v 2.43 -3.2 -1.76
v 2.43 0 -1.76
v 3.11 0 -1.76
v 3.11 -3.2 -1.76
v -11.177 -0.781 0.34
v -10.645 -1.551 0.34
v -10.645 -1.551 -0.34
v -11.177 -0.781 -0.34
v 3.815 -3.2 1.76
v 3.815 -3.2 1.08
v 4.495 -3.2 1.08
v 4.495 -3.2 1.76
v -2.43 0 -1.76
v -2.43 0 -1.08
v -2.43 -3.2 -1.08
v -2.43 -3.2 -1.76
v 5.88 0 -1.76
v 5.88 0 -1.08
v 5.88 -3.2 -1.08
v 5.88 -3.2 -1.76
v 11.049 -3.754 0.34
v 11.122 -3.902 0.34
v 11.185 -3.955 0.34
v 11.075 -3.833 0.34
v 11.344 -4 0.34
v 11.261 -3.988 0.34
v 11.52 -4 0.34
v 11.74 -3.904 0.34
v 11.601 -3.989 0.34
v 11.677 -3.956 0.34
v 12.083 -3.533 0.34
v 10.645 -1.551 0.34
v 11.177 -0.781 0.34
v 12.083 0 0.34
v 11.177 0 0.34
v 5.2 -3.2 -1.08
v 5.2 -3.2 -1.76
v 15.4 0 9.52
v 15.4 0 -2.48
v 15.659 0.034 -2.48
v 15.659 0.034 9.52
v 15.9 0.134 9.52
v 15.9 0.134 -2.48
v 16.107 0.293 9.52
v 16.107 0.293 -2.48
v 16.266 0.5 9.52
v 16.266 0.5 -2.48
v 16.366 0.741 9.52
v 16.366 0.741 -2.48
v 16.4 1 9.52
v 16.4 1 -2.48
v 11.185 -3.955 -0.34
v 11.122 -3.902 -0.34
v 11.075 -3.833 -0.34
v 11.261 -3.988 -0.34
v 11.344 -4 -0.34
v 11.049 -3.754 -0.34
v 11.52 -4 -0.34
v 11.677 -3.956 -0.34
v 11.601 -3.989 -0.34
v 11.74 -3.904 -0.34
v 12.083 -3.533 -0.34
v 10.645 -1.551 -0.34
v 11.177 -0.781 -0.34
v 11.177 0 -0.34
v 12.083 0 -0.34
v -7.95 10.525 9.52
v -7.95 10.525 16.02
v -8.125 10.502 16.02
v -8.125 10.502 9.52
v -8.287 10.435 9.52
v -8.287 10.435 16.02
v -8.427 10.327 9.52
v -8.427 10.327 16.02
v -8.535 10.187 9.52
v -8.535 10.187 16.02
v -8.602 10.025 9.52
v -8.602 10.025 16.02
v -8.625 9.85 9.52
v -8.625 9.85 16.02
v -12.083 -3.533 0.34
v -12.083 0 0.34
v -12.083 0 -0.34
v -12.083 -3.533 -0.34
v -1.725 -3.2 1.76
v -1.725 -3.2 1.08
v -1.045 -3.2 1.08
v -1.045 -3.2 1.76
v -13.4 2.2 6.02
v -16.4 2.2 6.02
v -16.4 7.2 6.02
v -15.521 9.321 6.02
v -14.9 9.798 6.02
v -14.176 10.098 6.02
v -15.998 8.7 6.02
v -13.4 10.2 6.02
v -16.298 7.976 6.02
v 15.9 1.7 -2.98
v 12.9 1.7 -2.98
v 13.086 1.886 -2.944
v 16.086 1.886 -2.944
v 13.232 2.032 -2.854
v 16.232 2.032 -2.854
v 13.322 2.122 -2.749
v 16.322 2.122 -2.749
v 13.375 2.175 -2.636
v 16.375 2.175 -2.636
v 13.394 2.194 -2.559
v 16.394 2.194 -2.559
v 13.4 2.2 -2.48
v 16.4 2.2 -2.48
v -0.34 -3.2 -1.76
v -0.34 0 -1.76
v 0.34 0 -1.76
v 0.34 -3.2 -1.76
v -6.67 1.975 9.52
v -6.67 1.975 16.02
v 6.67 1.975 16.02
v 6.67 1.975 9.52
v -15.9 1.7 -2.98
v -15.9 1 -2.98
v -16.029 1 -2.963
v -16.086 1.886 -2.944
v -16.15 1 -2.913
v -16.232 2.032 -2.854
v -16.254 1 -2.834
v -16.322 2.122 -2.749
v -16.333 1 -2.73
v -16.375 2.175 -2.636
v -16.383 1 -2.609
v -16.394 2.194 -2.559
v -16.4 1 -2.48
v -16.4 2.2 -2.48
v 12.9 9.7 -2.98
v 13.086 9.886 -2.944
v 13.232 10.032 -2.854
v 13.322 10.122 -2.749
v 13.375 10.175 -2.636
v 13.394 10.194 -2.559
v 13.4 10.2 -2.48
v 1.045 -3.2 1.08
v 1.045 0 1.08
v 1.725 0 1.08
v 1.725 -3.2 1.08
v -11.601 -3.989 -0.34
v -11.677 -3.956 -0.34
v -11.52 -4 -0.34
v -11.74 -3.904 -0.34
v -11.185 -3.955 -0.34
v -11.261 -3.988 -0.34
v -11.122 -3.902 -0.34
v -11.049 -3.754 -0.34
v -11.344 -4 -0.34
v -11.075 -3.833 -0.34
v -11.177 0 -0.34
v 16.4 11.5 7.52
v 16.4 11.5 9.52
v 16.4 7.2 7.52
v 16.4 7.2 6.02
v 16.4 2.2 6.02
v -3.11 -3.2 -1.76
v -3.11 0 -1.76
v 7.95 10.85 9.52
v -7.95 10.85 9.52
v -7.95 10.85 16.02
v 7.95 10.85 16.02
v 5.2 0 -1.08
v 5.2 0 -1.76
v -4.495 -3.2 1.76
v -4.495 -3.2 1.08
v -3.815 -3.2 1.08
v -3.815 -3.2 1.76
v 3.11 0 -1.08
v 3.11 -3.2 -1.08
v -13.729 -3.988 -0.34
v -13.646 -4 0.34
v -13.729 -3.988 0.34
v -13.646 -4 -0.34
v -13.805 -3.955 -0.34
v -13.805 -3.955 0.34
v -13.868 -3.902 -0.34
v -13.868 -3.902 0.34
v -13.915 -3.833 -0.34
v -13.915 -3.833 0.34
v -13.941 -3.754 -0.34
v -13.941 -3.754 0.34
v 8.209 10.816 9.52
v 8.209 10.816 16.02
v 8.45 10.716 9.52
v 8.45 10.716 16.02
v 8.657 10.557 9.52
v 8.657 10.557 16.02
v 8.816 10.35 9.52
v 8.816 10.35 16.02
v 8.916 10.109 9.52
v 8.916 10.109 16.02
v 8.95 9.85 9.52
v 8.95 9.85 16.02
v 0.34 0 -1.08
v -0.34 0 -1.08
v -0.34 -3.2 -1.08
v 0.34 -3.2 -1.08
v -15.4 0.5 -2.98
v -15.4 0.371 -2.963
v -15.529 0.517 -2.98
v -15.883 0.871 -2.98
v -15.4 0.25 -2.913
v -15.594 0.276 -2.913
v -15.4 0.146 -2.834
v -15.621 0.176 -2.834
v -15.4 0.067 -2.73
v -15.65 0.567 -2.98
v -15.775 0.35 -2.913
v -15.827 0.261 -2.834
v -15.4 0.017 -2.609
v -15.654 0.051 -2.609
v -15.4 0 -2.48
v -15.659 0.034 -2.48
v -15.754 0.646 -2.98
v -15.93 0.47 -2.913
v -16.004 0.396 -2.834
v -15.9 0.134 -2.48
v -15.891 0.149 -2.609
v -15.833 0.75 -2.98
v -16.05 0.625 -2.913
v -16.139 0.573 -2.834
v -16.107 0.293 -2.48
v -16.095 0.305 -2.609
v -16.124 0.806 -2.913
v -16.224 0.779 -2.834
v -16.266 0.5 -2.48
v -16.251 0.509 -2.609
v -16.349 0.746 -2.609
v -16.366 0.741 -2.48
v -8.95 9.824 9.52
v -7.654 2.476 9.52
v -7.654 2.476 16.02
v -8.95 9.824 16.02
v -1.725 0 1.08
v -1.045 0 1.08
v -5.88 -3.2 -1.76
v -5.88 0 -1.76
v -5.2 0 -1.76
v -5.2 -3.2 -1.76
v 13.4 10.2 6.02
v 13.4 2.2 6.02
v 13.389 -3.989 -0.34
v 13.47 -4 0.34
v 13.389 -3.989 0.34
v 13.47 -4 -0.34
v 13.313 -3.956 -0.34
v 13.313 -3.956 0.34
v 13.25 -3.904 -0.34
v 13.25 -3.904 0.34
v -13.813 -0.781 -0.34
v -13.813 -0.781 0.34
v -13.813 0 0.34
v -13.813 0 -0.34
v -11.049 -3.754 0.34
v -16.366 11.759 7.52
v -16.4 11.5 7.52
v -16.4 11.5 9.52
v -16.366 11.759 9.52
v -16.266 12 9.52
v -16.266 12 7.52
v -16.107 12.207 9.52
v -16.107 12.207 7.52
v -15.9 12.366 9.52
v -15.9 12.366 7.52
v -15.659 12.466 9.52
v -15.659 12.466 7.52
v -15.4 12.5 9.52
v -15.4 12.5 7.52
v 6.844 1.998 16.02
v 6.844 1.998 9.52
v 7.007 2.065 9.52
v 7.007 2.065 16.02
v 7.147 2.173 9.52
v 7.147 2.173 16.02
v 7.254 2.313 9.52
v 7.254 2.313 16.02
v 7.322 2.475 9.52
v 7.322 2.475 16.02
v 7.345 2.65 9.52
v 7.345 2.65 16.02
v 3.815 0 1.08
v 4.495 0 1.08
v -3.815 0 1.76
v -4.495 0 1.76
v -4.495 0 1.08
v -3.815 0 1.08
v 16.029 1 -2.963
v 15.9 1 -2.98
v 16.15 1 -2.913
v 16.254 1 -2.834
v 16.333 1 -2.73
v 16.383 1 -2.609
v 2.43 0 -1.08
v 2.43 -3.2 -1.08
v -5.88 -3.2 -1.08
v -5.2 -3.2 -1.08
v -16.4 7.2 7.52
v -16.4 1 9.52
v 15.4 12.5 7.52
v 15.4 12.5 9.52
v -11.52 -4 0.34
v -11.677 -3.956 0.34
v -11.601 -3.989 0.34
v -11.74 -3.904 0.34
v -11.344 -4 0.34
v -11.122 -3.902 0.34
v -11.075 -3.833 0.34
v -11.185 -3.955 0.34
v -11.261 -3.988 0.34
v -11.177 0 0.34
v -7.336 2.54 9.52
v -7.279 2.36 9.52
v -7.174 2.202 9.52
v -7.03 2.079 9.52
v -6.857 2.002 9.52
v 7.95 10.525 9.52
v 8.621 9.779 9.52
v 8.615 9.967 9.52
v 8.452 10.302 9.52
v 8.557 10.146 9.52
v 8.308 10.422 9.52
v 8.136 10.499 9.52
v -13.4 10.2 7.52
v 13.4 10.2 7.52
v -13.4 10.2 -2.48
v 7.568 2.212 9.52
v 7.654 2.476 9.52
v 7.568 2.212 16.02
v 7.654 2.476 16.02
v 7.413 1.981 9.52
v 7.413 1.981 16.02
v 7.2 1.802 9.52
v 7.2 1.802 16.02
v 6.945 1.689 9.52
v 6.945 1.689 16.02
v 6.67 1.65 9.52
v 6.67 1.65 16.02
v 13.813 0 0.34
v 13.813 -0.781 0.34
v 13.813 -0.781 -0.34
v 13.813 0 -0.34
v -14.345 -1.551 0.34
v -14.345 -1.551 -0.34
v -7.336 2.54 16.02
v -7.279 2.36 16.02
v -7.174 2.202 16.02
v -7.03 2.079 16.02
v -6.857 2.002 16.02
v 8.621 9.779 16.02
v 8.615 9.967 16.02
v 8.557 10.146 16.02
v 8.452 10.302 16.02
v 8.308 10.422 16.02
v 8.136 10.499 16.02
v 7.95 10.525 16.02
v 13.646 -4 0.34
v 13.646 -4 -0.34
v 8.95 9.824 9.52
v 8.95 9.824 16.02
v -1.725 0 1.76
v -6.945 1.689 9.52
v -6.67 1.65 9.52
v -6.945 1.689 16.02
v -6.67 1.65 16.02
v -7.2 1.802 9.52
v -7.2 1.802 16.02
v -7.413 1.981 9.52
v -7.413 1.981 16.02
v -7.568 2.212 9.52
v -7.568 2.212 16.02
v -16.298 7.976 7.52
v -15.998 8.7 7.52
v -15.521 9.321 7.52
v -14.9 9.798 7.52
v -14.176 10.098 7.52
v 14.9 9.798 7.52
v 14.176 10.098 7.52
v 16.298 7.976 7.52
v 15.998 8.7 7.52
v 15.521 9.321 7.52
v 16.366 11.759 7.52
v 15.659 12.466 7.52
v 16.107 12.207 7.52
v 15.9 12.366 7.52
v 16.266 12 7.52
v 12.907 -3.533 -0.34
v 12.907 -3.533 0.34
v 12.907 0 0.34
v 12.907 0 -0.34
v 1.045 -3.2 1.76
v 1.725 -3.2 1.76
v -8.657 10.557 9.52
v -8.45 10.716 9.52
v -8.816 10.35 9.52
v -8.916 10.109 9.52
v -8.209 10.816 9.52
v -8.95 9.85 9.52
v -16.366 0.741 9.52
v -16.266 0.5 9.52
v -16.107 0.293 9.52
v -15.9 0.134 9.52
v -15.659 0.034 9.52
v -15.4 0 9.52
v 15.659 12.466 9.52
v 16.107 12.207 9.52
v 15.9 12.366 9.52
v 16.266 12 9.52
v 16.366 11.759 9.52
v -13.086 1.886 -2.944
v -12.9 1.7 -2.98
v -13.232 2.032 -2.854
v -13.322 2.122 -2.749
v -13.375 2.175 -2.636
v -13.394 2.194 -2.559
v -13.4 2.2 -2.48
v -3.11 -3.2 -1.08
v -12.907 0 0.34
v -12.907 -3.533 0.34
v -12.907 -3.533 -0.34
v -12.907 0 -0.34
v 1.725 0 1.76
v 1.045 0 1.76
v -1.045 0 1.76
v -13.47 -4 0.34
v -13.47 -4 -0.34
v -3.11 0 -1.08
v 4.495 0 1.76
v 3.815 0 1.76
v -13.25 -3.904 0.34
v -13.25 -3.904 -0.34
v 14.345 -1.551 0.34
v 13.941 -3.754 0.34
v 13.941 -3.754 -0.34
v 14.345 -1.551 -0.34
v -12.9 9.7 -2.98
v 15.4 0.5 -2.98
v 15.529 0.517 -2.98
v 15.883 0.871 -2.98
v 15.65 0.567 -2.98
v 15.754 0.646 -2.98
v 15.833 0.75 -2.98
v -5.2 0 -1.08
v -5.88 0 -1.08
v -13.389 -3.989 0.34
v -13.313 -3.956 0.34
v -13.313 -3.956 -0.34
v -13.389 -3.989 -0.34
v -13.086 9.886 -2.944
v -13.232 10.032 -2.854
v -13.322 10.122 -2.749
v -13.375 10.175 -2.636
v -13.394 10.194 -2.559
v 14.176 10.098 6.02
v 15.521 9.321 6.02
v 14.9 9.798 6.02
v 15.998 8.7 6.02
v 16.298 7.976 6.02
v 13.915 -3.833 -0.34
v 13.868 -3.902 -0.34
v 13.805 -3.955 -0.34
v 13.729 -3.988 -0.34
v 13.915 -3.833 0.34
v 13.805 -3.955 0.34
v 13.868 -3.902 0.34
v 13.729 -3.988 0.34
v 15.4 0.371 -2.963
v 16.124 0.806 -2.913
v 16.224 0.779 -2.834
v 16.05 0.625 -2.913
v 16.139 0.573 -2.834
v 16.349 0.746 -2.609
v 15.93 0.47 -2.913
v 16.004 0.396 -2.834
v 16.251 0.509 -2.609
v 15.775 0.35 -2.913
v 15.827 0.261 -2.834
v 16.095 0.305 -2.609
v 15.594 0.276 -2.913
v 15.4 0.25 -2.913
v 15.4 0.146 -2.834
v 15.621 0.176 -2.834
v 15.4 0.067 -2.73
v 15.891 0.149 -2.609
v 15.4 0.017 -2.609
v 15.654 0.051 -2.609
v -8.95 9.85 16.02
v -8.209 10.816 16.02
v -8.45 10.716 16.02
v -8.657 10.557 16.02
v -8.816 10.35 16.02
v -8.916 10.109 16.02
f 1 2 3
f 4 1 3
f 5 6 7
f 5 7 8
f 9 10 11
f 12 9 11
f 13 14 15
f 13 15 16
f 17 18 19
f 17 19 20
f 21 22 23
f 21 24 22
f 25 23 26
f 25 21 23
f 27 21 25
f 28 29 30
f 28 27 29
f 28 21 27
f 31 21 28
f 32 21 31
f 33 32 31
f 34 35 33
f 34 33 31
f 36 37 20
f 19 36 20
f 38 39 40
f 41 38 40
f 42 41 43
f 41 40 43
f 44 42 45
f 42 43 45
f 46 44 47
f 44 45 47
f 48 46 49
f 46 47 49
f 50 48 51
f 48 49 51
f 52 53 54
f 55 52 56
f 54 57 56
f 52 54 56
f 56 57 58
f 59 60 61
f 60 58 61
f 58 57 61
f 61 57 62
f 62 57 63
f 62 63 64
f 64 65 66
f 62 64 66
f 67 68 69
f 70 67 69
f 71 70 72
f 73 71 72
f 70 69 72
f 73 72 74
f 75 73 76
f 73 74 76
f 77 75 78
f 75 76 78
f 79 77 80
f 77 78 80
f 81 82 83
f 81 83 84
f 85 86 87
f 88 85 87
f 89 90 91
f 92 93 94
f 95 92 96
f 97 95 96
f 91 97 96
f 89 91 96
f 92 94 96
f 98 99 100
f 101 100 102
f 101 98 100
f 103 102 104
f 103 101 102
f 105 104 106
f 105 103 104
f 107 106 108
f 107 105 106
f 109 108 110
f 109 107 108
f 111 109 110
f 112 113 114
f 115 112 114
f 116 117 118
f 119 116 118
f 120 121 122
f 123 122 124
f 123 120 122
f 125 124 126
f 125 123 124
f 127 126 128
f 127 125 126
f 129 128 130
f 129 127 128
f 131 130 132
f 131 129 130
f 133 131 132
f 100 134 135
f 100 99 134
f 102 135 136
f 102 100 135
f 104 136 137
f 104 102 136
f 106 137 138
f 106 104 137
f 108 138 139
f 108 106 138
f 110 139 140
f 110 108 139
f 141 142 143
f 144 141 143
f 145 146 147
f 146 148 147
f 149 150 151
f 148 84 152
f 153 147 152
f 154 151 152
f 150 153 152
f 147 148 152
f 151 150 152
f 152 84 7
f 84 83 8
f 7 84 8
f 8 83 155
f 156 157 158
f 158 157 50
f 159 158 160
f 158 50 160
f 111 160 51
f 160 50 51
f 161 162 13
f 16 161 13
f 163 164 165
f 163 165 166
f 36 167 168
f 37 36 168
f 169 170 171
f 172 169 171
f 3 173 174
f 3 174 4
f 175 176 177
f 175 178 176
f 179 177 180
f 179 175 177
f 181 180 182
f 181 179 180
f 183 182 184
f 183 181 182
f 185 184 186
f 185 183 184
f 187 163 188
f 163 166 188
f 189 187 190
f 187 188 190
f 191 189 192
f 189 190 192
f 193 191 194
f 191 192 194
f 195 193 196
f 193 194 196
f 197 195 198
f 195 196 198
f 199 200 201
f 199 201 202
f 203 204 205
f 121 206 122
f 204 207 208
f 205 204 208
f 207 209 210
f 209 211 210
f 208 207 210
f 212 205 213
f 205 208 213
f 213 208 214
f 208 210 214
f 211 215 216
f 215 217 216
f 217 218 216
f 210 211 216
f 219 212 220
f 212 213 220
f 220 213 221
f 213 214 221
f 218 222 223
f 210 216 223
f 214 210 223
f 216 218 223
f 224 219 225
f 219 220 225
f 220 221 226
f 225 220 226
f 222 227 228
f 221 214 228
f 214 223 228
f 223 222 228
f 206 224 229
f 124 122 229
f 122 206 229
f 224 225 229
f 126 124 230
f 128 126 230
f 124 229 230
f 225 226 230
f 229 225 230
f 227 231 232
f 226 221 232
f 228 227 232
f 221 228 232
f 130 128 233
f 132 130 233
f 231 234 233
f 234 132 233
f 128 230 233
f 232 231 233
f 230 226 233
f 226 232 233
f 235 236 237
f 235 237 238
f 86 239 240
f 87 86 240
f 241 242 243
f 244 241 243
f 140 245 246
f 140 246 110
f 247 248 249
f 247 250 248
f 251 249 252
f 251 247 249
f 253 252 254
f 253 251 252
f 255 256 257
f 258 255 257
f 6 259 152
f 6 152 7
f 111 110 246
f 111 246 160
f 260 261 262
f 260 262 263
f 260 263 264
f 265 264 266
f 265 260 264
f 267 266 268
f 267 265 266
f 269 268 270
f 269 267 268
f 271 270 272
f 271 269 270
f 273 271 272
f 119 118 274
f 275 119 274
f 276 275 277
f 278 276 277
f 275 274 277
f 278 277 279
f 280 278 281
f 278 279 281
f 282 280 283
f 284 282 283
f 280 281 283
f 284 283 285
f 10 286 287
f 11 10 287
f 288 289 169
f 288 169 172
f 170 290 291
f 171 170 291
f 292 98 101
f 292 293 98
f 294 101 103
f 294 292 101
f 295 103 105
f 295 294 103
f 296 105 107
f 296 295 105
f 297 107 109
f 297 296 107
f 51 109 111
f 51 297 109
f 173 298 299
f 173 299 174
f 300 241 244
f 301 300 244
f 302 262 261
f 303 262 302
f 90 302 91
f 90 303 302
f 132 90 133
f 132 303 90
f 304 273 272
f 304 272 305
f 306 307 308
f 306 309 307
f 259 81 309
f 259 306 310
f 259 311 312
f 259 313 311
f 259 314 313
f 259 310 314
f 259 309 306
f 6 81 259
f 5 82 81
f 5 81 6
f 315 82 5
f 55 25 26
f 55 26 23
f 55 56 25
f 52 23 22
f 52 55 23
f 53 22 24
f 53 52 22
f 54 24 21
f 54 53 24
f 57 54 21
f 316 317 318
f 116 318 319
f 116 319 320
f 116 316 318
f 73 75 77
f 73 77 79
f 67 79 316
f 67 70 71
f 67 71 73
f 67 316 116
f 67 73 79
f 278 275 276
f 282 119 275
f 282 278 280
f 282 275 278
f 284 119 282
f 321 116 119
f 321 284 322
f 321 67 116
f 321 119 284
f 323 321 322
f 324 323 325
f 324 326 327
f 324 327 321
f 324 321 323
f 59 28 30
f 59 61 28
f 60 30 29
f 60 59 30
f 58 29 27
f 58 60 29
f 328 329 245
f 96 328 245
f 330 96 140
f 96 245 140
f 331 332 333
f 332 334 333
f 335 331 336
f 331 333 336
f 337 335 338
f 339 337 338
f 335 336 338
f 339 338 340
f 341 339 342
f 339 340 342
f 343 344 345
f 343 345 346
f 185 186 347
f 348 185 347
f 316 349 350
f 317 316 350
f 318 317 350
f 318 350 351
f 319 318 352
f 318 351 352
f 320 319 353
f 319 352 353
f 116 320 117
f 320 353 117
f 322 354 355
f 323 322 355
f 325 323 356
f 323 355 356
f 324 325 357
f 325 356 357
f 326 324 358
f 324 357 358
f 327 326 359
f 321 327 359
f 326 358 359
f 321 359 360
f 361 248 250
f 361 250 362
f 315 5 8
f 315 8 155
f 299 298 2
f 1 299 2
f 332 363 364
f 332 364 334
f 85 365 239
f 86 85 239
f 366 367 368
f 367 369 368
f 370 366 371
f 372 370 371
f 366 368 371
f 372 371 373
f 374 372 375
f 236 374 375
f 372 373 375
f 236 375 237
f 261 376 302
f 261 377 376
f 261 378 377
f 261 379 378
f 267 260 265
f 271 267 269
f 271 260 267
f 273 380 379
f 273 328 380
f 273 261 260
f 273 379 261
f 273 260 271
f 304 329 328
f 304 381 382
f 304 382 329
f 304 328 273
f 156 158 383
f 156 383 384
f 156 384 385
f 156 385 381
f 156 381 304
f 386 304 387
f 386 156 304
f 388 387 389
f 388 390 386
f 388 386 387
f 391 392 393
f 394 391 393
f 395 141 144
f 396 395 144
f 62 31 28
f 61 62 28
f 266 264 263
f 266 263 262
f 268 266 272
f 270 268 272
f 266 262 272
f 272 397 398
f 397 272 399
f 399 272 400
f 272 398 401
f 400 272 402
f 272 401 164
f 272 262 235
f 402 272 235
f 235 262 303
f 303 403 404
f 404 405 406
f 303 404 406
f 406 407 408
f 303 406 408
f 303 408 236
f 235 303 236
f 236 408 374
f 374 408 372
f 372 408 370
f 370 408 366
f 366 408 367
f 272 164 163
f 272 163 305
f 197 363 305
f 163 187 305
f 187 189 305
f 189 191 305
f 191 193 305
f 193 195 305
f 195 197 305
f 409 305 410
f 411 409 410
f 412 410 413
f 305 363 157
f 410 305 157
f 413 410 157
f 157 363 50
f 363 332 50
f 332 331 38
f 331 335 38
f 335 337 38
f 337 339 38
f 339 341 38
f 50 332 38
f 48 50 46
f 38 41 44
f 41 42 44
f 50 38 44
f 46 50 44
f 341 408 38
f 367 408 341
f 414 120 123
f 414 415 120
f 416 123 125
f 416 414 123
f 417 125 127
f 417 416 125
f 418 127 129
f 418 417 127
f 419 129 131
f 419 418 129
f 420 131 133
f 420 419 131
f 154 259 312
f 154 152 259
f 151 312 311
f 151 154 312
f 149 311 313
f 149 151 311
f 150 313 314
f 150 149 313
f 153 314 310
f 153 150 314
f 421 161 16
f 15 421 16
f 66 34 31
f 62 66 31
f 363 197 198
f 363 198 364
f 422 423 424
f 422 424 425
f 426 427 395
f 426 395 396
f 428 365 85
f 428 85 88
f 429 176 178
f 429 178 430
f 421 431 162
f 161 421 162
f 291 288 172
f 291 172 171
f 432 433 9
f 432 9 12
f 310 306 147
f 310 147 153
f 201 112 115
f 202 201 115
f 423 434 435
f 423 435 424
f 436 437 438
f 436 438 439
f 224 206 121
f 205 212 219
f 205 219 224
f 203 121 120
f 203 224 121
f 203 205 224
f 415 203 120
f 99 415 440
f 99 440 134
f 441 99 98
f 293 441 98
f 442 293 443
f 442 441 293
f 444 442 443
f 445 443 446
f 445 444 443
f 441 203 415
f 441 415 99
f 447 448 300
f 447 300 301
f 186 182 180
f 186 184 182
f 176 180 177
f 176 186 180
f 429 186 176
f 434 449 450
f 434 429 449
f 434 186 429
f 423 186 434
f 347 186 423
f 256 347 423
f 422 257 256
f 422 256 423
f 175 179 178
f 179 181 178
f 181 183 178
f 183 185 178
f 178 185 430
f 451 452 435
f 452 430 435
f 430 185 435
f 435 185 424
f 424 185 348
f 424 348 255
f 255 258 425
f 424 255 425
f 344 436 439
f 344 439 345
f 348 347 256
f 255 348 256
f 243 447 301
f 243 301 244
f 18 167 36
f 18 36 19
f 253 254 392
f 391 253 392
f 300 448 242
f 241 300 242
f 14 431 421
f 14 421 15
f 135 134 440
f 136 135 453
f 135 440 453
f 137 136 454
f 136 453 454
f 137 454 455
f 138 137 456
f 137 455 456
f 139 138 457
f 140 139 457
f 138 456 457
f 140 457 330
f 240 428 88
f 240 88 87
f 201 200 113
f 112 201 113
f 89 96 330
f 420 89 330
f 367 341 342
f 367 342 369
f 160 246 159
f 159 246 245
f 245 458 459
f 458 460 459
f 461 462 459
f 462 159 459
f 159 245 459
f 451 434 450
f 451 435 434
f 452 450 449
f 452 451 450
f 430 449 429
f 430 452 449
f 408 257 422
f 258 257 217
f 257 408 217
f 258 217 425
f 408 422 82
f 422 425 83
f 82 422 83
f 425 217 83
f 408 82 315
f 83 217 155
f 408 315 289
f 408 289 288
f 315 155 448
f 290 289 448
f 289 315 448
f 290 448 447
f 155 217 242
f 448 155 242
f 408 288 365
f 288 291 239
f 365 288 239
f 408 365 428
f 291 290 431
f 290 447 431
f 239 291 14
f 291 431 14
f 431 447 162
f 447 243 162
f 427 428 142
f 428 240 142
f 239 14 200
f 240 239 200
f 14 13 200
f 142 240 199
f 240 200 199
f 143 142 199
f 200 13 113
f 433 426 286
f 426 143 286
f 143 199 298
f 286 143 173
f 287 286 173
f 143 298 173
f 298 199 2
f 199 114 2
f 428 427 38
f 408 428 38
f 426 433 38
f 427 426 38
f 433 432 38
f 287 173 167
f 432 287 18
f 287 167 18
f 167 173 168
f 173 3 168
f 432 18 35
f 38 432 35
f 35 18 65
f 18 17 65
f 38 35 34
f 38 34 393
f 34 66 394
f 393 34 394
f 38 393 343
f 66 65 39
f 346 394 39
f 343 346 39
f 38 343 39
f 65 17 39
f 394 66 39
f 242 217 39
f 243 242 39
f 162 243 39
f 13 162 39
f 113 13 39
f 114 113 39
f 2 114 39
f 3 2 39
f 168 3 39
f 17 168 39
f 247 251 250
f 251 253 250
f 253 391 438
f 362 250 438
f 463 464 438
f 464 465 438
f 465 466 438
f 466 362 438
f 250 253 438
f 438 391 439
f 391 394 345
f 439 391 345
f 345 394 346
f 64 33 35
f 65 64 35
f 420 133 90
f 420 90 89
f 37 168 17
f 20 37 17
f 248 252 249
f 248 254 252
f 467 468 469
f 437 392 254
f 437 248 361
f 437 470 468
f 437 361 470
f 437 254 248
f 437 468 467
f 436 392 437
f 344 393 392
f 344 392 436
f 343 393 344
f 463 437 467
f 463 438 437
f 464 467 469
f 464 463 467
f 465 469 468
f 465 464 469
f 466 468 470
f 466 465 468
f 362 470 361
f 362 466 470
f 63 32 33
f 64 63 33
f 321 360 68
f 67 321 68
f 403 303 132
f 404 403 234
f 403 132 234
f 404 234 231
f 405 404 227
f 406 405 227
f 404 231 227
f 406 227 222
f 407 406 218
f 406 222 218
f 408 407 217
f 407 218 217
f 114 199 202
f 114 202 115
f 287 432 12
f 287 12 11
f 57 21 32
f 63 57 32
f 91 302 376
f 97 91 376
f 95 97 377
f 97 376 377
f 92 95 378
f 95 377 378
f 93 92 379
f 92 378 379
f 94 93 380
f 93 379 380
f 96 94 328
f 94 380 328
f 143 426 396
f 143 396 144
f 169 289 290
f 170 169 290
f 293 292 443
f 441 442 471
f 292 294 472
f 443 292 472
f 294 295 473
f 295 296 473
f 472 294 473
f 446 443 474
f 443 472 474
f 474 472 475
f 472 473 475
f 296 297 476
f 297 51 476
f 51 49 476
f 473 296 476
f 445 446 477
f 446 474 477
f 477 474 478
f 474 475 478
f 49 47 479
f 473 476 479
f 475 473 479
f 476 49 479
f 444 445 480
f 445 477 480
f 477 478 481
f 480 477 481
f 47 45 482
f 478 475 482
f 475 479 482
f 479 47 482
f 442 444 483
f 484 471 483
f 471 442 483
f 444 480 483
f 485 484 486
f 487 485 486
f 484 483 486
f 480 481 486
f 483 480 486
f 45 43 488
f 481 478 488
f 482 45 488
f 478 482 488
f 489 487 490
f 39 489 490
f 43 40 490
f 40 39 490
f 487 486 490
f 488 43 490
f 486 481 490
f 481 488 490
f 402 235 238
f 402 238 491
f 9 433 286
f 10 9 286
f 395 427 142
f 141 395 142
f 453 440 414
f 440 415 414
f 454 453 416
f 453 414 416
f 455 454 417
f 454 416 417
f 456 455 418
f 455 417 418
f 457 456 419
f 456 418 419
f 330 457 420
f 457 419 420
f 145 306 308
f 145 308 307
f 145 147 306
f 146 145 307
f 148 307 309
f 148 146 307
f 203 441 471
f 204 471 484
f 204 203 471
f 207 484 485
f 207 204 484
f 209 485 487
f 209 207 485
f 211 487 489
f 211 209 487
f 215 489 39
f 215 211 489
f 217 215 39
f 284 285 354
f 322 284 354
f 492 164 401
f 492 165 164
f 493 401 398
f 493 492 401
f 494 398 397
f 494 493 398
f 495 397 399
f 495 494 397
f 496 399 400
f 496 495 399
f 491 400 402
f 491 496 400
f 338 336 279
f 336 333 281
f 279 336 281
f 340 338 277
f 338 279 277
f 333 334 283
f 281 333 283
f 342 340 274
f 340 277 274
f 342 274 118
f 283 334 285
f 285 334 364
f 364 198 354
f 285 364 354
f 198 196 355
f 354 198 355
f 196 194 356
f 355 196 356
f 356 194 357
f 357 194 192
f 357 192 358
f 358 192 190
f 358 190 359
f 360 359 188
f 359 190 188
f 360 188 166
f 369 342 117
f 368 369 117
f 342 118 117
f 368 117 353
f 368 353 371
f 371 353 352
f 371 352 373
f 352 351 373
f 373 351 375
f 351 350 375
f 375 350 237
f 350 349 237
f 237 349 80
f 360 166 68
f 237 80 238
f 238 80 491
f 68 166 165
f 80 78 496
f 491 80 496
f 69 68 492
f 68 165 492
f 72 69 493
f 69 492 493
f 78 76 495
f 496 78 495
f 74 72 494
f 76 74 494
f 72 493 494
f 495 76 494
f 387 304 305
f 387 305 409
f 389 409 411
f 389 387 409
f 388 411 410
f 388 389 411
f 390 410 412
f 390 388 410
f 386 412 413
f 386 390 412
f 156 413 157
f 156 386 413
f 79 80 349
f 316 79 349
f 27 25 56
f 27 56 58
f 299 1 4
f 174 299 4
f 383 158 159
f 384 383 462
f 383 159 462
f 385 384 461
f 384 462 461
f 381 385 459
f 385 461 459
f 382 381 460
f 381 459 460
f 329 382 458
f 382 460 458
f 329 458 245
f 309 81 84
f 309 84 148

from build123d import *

# Parameters (mm, degrees)
SKETCH1_W             = 0.68
SKETCH1_H             = 0.68
BOSS_EXTRUDE1_DEPTH   = 3.2
BOSS_EXTRUDE1_2_DEPTH = 3.2
BOSS_EXTRUDE1_3_DEPTH = 3.2
BOSS_EXTRUDE1_4_DEPTH = 3.2
BOSS_EXTRUDE1_5_DEPTH = 3.2
BOSS_EXTRUDE1_6_DEPTH = 3.2
BOSS_EXTRUDE1_7_DEPTH = 3.2
BOSS_EXTRUDE1_8_DEPTH = 3.2
BOSS_EXTRUDE1_9_DEPTH = 3.2
SKETCH2_W             = 32.8
SKETCH2_H             = 12.5
BOSS_EXTRUDE2_DEPTH   = 12.5
FILLET1_R             = 1
SKETCH3_W             = 10.5
SKETCH3_H             = 2.3
CUT_EXTRUDE1_DEPTH    = 37.369223253
SKETCH4_W             = 3.7
SKETCH4_H             = 0.68
BOSS_EXTRUDE3_DEPTH   = 4
CUT_EXTRUDE5_DEPTH    = 23.571716816
FILLET2_R             = 0.3
BOSS_EXTRUDE4_DEPTH   = 6.5
FILLET3_R             = 1
CUT_EXTRUDE6_DEPTH    = 6.5
FILLET4_R             = 3
SKETCH12_W            = 3
SKETCH12_H            = 9
CUT_EXTRUDE7_DEPTH    = 8
FILLET5_R             = 0.5


with BuildPart() as part:
    # Sketch1 → Boss-Extrude1 (new body)
    with BuildSketch(Plane(origin=(0, 0, 0), x_dir=(1, 0, 0), z_dir=(0, 1, 0))):
        with Locations((1.385, -1.42)):
            Rectangle(SKETCH1_W, SKETCH1_H)
    extrude(amount=-BOSS_EXTRUDE1_DEPTH)



with BuildPart() as body_2:
    # Sketch1 → Boss-Extrude1 2 (new body)
    with BuildSketch(Plane(origin=(0, 0, 0), x_dir=(1, 0, 0), z_dir=(0, 1, 0))):
        with Locations((-1.385, -1.42)):
            Rectangle(SKETCH1_W, SKETCH1_H)
    extrude(amount=-BOSS_EXTRUDE1_2_DEPTH)


with BuildPart() as body_3:
    # Sketch1 → Boss-Extrude1 3 (new body)
    with BuildSketch(Plane(origin=(0, 0, 0), x_dir=(1, 0, 0), z_dir=(0, 1, 0))):
        with Locations((-5.54, 1.42)):
            Rectangle(SKETCH1_W, SKETCH1_H)
    extrude(amount=-BOSS_EXTRUDE1_3_DEPTH)


with BuildPart() as body_4:
    # Sketch1 → Boss-Extrude1 4 (new body)
    with BuildSketch(Plane(origin=(0, 0, 0), x_dir=(1, 0, 0), z_dir=(0, 1, 0))):
        with Locations((-2.77, 1.42)):
            Rectangle(SKETCH1_W, SKETCH1_H)
    extrude(amount=-BOSS_EXTRUDE1_4_DEPTH)


with BuildPart() as body_5:
    # Sketch1 → Boss-Extrude1 5 (new body)
    with BuildSketch(Plane(origin=(0, 0, 0), x_dir=(1, 0, 0), z_dir=(0, 1, 0))):
        with Locations((-4.155, -1.42)):
            Rectangle(SKETCH1_W, SKETCH1_H)
    extrude(amount=-BOSS_EXTRUDE1_5_DEPTH)


with BuildPart() as body_6:
    # Sketch1 → Boss-Extrude1 6 (new body)
    with BuildSketch(Plane(origin=(0, 0, 0), x_dir=(1, 0, 0), z_dir=(0, 1, 0))):
        with Locations((0, 1.42)):
            Rectangle(SKETCH1_W, SKETCH1_H)
    extrude(amount=-BOSS_EXTRUDE1_6_DEPTH)


with BuildPart() as body_7:
    # Sketch1 → Boss-Extrude1 7 (new body)
    with BuildSketch(Plane(origin=(0, 0, 0), x_dir=(1, 0, 0), z_dir=(0, 1, 0))):
        with Locations((4.155, -1.42)):
            Rectangle(SKETCH1_W, SKETCH1_H)
    extrude(amount=-BOSS_EXTRUDE1_7_DEPTH)


with BuildPart() as body_8:
    # Sketch1 → Boss-Extrude1 8 (new body)
    with BuildSketch(Plane(origin=(0, 0, 0), x_dir=(1, 0, 0), z_dir=(0, 1, 0))):
        with Locations((5.54, 1.42)):
            Rectangle(SKETCH1_W, SKETCH1_H)
    extrude(amount=-BOSS_EXTRUDE1_8_DEPTH)


with BuildPart() as body_9:
    # Sketch1 → Boss-Extrude1 9 (new body)
    with BuildSketch(Plane(origin=(0, 0, 0), x_dir=(1, 0, 0), z_dir=(0, 1, 0))):
        with Locations((2.77, 1.42)):
            Rectangle(SKETCH1_W, SKETCH1_H)
    extrude(amount=-BOSS_EXTRUDE1_9_DEPTH)


with BuildPart() as part_1:
    add(part.part)

    add(body_2.part)  # Boss-Extrude2 merges body 2

    add(body_3.part)  # Boss-Extrude2 merges body 3

    add(body_4.part)  # Boss-Extrude2 merges body 4

    add(body_5.part)  # Boss-Extrude2 merges body 5

    add(body_6.part)  # Boss-Extrude2 merges body 6

    add(body_7.part)  # Boss-Extrude2 merges body 7

    add(body_8.part)  # Boss-Extrude2 merges body 8

    add(body_9.part)  # Boss-Extrude2 merges body 9
    # Sketch2 → Boss-Extrude2 (add)
    with BuildSketch(Plane(origin=(0, 0, 0), x_dir=(1, 0, 0), z_dir=(0, 1, 0))):
        with Locations((0, -3.27)):
            Rectangle(SKETCH2_W, SKETCH2_H)
    extrude(amount=BOSS_EXTRUDE2_DEPTH)

    # Fillet1
    fillet1_edges = [part_1.edges().sort_by_distance(p)[0] for p in [
        (-16.4, 0, 3.27),
        (16.4, 0, 3.27),
        (-16.4, 12.5, 3.27),
        (16.4, 12.5, 3.27),
    ]]
    fillet(fillet1_edges, radius=FILLET1_R)

    # Sketch3 → Cut-Extrude1 (cut, through all)
    with BuildSketch(Plane(origin=(16.4, 0, 0), x_dir=(0, 0, -1), z_dir=(1, 0, 0))):
        with Locations((-2.27, 11.35)):
            Rectangle(SKETCH3_W, SKETCH3_H)
    extrude(amount=-CUT_EXTRUDE1_DEPTH, mode=Mode.SUBTRACT)

    # Sketch4 → Boss-Extrude3 (add)
    with BuildSketch(Plane.XZ):
        with Locations((-12.495, 0)):
            Rectangle(SKETCH4_W, SKETCH4_H)
        with Locations((12.495, 0)):
            Rectangle(SKETCH4_W, SKETCH4_H)
    extrude(amount=BOSS_EXTRUDE3_DEPTH)

    # Sketch6 → Cut-Extrude5 (cut, through all)
    with BuildSketch(Plane.XY.offset(0.34)):
        Polygon((-14.345, -1.550750234), (-13.813289593, -0.780582126), (-13.813289593, 0), (-14.345, 0), (-14.827308736, 0), (-14.827308736, -4), (-13.896384817, -4), align=None)
        Polygon((-12.907050916, 0), (-12.082949084, 0), (-12.082949084, -3.533172452), (-11.651133602, -4), (-13.338866398, -4), (-12.907050916, -3.533172452), align=None)
        Polygon((-11.176710407, 0), (-10.645, 0), (-10.162691264, 0), (-10.162691264, -4), (-11.093615183, -4), (-10.645, -1.550750234), (-11.176710407, -0.780582126), align=None)
        Polygon((10.645, -1.550750234), (11.176710407, -0.780582126), (11.176710407, 0), (10.645, 0), (10.162691264, 0), (10.162691264, -4), (11.093615183, -4), align=None)
        Polygon((12.082949084, 0), (12.082949084, -3.533172452), (11.651133602, -4), (13.338866398, -4), (12.907050916, -3.533172452), (12.907050916, 0), align=None)
        Polygon((13.813289593, 0), (14.345, 0), (14.827308736, 0), (14.827308736, -4), (13.896384817, -4), (14.345, -1.550750234), (13.813289593, -0.780582126), align=None)
    extrude(amount=-CUT_EXTRUDE5_DEPTH, mode=Mode.SUBTRACT)

    # Fillet2
    fillet2_edges = [part_1.edges().sort_by_distance(p)[0] for p in [
        (13.896384817, -4, 0),
        (11.093615183, -4, 0),
        (11.651133602, -4, 0),
        (13.338866398, -4, 0),
        (-13.338866398, -4, 0),
        (-11.651133602, -4, 0),
        (-11.093615183, -4, 0),
        (-13.896384817, -4, 0),
    ]]
    fillet(fillet2_edges, radius=FILLET2_R)

    # Sketch7 → Boss-Extrude4 (add)
    with BuildSketch(Plane.XY.offset(9.52)):
        Polygon((-8.95, 10.85), (8.95, 10.85), (8.95, 9.82390435), (7.508720125, 1.65), (-7.508720125, 1.65), (-8.95, 9.82390435), align=None)
    extrude(amount=BOSS_EXTRUDE4_DEPTH)

    # Fillet3
    fillet3_edges = [part_1.edges().sort_by_distance(p)[0] for p in [
        (-8.95, 10.85, 12.77),
        (-7.508720125, 1.65, 12.77),
        (7.508720125, 1.65, 12.77),
        (8.95, 10.85, 12.77),
    ]]
    fillet(fillet3_edges, radius=FILLET3_R)

    # Sketch10 → Cut-Extrude6 (cut)
    with BuildSketch(Plane.XY.offset(16.02)):
        with BuildLine():
            Line((-8.625, 9.85), (-7.335651287, 2.540327837))
            ThreePointArc((-7.335651287, 2.540327837), (-7.106424964, 2.135386694), (-6.669620494, 1.975))
            Line((-6.669620494, 1.975), (6.669620494, 1.975))
            ThreePointArc((6.669620494, 1.975), (7.146917571, 2.172702923), (7.344620494, 2.65))
            Line((7.344620494, 2.65), (8.621293798, 9.779362644))
            ThreePointArc((8.621293798, 9.779362644), (8.451649886, 10.301633028), (7.95, 10.525))
            Line((7.95, 10.525), (-7.95, 10.525))
            ThreePointArc((-7.95, 10.525), (-8.427297077, 10.327297077), (-8.625, 9.85))
        make_face()
    extrude(amount=-CUT_EXTRUDE6_DEPTH, mode=Mode.SUBTRACT)

    # Fillet4
    fillet4_edges = [part_1.edges().sort_by_distance(p)[0] for p in [
        (-16.4, 10.2, 2.27),
        (16.4, 10.2, 2.27),
    ]]
    fillet(fillet4_edges, radius=FILLET4_R)

    # Sketch12 → Cut-Extrude7 (cut)
    with BuildSketch(Plane(origin=(0, 10.2, 0), x_dir=(1, 0, 0), z_dir=(0, 1, 0))):
        with Locations((-14.9, -1.52)):
            Rectangle(SKETCH12_W, SKETCH12_H)
        with Locations((14.9, -1.52)):
            Rectangle(SKETCH12_W, SKETCH12_H)
    extrude(amount=-CUT_EXTRUDE7_DEPTH, mode=Mode.SUBTRACT)

    # Fillet5
    fillet5_edges = [part_1.edges().sort_by_distance(p)[0] for p in [
        (0, 0, -2.98),
        (-16.107106781, 0.292893219, -2.98),
        (16.107106781, 0.292893219, -2.98),
        (0, 10.2, -2.98),
        (16.4, 1.6, -2.98),
        (-16.4, 1.6, -2.98),
        (-14.9, 2.2, -2.98),
        (-13.4, 6.2, -2.98),
        (14.9, 2.2, -2.98),
        (13.4, 6.2, -2.98),
    ]]
    fillet(fillet5_edges, radius=FILLET5_R)


solid = part_1.part
